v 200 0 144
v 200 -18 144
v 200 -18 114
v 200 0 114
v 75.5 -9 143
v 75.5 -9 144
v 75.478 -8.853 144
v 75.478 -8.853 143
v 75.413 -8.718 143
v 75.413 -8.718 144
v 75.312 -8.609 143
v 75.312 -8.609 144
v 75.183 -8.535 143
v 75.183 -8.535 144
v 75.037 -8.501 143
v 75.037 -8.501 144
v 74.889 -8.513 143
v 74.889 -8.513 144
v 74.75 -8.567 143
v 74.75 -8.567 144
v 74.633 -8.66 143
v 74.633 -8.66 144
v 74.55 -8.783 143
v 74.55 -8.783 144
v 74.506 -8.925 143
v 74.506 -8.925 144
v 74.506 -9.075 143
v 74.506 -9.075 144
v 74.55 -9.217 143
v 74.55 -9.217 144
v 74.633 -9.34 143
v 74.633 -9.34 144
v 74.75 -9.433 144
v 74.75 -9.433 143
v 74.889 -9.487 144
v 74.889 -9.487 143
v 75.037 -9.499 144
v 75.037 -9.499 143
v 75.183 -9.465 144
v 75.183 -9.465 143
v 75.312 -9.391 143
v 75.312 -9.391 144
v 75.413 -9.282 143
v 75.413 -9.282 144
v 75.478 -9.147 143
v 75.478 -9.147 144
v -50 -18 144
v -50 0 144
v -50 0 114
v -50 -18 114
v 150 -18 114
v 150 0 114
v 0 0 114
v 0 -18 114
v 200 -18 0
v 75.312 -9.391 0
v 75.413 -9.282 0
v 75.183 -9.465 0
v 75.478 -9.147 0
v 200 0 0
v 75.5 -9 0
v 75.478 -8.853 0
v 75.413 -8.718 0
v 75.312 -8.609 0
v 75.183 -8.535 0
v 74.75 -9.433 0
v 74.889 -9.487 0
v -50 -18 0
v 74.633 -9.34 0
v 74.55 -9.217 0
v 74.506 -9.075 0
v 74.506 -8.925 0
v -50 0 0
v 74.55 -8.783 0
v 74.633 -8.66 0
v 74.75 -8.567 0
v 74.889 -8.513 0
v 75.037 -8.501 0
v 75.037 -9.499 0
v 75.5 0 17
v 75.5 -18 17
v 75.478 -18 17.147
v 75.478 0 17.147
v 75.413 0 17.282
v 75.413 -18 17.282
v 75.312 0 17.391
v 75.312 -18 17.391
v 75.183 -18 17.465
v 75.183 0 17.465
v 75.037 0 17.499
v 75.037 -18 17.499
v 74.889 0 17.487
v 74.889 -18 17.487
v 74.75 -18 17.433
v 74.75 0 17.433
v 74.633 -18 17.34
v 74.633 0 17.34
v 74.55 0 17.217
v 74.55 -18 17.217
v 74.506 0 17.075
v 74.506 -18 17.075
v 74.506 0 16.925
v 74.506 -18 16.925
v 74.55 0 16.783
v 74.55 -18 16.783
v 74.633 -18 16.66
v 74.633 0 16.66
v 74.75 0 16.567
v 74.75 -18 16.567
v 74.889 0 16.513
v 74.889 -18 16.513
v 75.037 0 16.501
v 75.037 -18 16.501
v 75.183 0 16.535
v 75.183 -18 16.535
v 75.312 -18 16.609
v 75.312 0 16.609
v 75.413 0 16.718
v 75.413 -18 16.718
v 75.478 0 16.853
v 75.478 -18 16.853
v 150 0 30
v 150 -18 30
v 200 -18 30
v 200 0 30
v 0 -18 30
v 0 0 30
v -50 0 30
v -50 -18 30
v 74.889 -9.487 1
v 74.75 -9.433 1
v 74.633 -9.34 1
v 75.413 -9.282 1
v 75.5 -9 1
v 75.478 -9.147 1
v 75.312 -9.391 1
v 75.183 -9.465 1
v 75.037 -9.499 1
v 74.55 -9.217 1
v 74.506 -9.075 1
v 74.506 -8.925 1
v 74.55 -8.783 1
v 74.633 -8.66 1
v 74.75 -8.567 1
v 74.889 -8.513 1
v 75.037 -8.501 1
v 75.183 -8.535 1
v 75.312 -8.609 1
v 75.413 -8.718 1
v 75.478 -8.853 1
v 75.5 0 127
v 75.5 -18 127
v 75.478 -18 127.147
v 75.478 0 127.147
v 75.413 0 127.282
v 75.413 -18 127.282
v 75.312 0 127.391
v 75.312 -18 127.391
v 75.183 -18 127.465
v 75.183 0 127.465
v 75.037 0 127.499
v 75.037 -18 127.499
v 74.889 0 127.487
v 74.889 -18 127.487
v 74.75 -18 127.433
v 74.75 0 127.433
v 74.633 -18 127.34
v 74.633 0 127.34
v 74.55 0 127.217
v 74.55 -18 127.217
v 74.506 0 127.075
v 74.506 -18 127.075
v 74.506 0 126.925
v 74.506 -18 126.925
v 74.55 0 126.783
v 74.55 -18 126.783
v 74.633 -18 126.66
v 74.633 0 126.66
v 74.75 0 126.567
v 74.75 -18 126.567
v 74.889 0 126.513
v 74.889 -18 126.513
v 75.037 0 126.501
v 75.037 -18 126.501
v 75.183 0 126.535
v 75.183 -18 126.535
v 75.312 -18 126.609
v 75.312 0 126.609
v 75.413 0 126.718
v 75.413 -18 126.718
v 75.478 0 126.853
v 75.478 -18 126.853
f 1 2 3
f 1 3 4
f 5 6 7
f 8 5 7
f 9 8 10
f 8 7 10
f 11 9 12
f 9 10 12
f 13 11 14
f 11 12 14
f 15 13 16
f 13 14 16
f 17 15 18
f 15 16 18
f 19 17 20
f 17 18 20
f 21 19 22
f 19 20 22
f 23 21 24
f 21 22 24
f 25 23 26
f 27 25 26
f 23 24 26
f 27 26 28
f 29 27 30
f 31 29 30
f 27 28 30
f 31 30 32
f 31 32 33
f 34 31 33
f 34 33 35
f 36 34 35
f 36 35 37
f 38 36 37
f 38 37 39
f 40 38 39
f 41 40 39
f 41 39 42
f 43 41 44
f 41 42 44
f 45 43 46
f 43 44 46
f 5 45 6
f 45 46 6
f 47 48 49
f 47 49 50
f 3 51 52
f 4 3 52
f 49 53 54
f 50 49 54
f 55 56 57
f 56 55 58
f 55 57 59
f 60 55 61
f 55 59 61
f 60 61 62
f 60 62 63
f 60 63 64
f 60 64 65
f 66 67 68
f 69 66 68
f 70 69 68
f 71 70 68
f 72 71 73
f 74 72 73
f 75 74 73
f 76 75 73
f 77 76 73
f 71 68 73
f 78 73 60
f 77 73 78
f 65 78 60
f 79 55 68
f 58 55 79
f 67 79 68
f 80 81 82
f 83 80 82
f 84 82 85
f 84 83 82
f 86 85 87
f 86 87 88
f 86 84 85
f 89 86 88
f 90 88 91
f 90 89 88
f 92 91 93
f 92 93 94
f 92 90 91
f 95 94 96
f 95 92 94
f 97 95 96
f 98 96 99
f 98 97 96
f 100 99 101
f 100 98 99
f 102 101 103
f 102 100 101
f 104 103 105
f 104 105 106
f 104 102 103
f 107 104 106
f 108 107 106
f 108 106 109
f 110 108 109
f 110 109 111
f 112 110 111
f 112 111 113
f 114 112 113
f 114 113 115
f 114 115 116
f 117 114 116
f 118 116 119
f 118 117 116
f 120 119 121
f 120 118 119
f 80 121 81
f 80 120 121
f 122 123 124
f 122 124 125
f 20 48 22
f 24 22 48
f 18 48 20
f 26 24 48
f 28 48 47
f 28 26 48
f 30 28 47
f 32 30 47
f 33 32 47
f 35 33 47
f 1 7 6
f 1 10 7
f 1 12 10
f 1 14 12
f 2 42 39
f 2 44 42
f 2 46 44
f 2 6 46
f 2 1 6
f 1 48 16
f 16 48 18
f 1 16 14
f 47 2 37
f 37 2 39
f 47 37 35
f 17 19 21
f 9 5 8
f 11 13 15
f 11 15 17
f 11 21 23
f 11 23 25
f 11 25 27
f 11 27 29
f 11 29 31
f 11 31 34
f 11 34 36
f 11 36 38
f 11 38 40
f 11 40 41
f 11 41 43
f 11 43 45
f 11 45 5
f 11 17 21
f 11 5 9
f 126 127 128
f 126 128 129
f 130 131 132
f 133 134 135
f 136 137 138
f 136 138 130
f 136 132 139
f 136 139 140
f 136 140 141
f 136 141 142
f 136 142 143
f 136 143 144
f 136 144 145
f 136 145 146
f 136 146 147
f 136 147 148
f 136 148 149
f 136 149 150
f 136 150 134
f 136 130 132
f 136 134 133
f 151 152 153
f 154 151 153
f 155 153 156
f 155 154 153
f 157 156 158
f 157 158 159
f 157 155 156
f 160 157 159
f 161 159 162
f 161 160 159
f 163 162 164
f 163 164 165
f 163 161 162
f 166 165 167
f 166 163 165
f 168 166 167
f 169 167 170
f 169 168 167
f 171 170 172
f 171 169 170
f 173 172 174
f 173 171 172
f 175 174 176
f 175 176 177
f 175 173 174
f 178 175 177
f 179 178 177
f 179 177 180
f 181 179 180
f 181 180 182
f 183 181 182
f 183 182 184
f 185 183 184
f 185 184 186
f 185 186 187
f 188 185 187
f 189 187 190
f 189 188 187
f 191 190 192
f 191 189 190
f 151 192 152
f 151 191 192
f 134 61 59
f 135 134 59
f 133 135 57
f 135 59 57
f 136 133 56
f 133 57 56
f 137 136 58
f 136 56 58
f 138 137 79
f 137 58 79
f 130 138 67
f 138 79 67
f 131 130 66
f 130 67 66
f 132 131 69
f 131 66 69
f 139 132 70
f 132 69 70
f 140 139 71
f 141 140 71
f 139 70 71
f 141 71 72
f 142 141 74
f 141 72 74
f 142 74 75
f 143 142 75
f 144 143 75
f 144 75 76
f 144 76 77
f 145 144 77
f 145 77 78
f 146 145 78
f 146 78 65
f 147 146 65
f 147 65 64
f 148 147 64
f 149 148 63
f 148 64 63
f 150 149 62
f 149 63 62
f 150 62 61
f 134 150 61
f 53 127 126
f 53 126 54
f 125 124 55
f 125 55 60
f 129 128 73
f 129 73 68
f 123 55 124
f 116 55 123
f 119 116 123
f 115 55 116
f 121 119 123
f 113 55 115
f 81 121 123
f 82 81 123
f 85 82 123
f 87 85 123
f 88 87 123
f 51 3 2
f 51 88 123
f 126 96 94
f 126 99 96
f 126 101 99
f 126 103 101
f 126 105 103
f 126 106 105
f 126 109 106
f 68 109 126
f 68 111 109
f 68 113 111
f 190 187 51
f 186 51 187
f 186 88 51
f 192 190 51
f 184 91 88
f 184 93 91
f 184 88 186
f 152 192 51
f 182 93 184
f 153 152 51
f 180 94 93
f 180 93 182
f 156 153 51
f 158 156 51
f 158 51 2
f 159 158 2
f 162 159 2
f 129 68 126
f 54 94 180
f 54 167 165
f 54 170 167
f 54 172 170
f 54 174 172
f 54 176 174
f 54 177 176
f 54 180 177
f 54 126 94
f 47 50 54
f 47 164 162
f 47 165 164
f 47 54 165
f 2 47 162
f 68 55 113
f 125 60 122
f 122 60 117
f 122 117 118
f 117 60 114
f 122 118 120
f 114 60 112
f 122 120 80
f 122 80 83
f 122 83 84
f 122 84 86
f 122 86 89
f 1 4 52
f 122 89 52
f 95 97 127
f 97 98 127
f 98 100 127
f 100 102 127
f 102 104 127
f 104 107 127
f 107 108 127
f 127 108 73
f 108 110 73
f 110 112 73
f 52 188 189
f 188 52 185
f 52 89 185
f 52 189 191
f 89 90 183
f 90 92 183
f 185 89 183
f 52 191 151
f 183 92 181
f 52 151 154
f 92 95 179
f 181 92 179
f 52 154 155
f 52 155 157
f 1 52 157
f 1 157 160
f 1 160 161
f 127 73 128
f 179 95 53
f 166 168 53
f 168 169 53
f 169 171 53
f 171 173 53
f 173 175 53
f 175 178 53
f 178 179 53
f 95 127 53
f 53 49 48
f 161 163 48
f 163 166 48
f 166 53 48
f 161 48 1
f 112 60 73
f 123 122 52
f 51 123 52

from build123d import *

# Parameters (mm, degrees)
F0_W     = 150
F0_H     = 144
F0_R     = 0.5
F1_DEPTH = 18
F2_R     = 0.5
F3_DEPTH = 1
F4_R     = 0.5
F5_DEPTH = 1
F6_W     = 18
F6_H     = 30
F7_DEPTH = 50
F8_W     = 18
F8_H     = 30
F9_DEPTH = 50


with BuildPart() as f1:
    # F0 (on Front) → F1 (new body)
    with BuildSketch(Plane.XZ):
        with Locations((75, 72)):
            Rectangle(F0_W, F0_H)
        with Locations((75, 17)):
            Circle(F0_R, mode=Mode.SUBTRACT)
        with Locations((75, 127)):
            Circle(F0_R, mode=Mode.SUBTRACT)
    extrude(amount=F1_DEPTH)

    # F2 (on face) → F3 (cut)
    with BuildSketch(Plane(origin=(0, 0, 0), x_dir=(1, 0, 0), z_dir=(0, 0, -1))):
        with Locations((75, 9)):
            Circle(F2_R)
    extrude(amount=-F3_DEPTH, mode=Mode.SUBTRACT)

    # F4 (on face) → F5 (cut)
    with BuildSketch(Plane.XY.offset(144)):
        with Locations((75, -9)):
            Circle(F4_R)
    extrude(amount=-F5_DEPTH, mode=Mode.SUBTRACT)

    # F6 (on face) → F7 (join)
    with BuildSketch(Plane(origin=(0, 0, 0), x_dir=(0, -1, 0), z_dir=(-1, 0, 0))):
        with Locations((9, 129)):
            Rectangle(F6_W, F6_H)
        with Locations((9, 15)):
            Rectangle(F6_W, F6_H)
    extrude(amount=F7_DEPTH)

    # F8 (on face) → F9 (join)
    with BuildSketch(Plane.YZ.offset(150)):
        with Locations((-9, 15)):
            Rectangle(F8_W, F8_H)
        with Locations((-9, 129)):
            Rectangle(F8_W, F8_H)
    extrude(amount=F9_DEPTH)


solid = f1.part
